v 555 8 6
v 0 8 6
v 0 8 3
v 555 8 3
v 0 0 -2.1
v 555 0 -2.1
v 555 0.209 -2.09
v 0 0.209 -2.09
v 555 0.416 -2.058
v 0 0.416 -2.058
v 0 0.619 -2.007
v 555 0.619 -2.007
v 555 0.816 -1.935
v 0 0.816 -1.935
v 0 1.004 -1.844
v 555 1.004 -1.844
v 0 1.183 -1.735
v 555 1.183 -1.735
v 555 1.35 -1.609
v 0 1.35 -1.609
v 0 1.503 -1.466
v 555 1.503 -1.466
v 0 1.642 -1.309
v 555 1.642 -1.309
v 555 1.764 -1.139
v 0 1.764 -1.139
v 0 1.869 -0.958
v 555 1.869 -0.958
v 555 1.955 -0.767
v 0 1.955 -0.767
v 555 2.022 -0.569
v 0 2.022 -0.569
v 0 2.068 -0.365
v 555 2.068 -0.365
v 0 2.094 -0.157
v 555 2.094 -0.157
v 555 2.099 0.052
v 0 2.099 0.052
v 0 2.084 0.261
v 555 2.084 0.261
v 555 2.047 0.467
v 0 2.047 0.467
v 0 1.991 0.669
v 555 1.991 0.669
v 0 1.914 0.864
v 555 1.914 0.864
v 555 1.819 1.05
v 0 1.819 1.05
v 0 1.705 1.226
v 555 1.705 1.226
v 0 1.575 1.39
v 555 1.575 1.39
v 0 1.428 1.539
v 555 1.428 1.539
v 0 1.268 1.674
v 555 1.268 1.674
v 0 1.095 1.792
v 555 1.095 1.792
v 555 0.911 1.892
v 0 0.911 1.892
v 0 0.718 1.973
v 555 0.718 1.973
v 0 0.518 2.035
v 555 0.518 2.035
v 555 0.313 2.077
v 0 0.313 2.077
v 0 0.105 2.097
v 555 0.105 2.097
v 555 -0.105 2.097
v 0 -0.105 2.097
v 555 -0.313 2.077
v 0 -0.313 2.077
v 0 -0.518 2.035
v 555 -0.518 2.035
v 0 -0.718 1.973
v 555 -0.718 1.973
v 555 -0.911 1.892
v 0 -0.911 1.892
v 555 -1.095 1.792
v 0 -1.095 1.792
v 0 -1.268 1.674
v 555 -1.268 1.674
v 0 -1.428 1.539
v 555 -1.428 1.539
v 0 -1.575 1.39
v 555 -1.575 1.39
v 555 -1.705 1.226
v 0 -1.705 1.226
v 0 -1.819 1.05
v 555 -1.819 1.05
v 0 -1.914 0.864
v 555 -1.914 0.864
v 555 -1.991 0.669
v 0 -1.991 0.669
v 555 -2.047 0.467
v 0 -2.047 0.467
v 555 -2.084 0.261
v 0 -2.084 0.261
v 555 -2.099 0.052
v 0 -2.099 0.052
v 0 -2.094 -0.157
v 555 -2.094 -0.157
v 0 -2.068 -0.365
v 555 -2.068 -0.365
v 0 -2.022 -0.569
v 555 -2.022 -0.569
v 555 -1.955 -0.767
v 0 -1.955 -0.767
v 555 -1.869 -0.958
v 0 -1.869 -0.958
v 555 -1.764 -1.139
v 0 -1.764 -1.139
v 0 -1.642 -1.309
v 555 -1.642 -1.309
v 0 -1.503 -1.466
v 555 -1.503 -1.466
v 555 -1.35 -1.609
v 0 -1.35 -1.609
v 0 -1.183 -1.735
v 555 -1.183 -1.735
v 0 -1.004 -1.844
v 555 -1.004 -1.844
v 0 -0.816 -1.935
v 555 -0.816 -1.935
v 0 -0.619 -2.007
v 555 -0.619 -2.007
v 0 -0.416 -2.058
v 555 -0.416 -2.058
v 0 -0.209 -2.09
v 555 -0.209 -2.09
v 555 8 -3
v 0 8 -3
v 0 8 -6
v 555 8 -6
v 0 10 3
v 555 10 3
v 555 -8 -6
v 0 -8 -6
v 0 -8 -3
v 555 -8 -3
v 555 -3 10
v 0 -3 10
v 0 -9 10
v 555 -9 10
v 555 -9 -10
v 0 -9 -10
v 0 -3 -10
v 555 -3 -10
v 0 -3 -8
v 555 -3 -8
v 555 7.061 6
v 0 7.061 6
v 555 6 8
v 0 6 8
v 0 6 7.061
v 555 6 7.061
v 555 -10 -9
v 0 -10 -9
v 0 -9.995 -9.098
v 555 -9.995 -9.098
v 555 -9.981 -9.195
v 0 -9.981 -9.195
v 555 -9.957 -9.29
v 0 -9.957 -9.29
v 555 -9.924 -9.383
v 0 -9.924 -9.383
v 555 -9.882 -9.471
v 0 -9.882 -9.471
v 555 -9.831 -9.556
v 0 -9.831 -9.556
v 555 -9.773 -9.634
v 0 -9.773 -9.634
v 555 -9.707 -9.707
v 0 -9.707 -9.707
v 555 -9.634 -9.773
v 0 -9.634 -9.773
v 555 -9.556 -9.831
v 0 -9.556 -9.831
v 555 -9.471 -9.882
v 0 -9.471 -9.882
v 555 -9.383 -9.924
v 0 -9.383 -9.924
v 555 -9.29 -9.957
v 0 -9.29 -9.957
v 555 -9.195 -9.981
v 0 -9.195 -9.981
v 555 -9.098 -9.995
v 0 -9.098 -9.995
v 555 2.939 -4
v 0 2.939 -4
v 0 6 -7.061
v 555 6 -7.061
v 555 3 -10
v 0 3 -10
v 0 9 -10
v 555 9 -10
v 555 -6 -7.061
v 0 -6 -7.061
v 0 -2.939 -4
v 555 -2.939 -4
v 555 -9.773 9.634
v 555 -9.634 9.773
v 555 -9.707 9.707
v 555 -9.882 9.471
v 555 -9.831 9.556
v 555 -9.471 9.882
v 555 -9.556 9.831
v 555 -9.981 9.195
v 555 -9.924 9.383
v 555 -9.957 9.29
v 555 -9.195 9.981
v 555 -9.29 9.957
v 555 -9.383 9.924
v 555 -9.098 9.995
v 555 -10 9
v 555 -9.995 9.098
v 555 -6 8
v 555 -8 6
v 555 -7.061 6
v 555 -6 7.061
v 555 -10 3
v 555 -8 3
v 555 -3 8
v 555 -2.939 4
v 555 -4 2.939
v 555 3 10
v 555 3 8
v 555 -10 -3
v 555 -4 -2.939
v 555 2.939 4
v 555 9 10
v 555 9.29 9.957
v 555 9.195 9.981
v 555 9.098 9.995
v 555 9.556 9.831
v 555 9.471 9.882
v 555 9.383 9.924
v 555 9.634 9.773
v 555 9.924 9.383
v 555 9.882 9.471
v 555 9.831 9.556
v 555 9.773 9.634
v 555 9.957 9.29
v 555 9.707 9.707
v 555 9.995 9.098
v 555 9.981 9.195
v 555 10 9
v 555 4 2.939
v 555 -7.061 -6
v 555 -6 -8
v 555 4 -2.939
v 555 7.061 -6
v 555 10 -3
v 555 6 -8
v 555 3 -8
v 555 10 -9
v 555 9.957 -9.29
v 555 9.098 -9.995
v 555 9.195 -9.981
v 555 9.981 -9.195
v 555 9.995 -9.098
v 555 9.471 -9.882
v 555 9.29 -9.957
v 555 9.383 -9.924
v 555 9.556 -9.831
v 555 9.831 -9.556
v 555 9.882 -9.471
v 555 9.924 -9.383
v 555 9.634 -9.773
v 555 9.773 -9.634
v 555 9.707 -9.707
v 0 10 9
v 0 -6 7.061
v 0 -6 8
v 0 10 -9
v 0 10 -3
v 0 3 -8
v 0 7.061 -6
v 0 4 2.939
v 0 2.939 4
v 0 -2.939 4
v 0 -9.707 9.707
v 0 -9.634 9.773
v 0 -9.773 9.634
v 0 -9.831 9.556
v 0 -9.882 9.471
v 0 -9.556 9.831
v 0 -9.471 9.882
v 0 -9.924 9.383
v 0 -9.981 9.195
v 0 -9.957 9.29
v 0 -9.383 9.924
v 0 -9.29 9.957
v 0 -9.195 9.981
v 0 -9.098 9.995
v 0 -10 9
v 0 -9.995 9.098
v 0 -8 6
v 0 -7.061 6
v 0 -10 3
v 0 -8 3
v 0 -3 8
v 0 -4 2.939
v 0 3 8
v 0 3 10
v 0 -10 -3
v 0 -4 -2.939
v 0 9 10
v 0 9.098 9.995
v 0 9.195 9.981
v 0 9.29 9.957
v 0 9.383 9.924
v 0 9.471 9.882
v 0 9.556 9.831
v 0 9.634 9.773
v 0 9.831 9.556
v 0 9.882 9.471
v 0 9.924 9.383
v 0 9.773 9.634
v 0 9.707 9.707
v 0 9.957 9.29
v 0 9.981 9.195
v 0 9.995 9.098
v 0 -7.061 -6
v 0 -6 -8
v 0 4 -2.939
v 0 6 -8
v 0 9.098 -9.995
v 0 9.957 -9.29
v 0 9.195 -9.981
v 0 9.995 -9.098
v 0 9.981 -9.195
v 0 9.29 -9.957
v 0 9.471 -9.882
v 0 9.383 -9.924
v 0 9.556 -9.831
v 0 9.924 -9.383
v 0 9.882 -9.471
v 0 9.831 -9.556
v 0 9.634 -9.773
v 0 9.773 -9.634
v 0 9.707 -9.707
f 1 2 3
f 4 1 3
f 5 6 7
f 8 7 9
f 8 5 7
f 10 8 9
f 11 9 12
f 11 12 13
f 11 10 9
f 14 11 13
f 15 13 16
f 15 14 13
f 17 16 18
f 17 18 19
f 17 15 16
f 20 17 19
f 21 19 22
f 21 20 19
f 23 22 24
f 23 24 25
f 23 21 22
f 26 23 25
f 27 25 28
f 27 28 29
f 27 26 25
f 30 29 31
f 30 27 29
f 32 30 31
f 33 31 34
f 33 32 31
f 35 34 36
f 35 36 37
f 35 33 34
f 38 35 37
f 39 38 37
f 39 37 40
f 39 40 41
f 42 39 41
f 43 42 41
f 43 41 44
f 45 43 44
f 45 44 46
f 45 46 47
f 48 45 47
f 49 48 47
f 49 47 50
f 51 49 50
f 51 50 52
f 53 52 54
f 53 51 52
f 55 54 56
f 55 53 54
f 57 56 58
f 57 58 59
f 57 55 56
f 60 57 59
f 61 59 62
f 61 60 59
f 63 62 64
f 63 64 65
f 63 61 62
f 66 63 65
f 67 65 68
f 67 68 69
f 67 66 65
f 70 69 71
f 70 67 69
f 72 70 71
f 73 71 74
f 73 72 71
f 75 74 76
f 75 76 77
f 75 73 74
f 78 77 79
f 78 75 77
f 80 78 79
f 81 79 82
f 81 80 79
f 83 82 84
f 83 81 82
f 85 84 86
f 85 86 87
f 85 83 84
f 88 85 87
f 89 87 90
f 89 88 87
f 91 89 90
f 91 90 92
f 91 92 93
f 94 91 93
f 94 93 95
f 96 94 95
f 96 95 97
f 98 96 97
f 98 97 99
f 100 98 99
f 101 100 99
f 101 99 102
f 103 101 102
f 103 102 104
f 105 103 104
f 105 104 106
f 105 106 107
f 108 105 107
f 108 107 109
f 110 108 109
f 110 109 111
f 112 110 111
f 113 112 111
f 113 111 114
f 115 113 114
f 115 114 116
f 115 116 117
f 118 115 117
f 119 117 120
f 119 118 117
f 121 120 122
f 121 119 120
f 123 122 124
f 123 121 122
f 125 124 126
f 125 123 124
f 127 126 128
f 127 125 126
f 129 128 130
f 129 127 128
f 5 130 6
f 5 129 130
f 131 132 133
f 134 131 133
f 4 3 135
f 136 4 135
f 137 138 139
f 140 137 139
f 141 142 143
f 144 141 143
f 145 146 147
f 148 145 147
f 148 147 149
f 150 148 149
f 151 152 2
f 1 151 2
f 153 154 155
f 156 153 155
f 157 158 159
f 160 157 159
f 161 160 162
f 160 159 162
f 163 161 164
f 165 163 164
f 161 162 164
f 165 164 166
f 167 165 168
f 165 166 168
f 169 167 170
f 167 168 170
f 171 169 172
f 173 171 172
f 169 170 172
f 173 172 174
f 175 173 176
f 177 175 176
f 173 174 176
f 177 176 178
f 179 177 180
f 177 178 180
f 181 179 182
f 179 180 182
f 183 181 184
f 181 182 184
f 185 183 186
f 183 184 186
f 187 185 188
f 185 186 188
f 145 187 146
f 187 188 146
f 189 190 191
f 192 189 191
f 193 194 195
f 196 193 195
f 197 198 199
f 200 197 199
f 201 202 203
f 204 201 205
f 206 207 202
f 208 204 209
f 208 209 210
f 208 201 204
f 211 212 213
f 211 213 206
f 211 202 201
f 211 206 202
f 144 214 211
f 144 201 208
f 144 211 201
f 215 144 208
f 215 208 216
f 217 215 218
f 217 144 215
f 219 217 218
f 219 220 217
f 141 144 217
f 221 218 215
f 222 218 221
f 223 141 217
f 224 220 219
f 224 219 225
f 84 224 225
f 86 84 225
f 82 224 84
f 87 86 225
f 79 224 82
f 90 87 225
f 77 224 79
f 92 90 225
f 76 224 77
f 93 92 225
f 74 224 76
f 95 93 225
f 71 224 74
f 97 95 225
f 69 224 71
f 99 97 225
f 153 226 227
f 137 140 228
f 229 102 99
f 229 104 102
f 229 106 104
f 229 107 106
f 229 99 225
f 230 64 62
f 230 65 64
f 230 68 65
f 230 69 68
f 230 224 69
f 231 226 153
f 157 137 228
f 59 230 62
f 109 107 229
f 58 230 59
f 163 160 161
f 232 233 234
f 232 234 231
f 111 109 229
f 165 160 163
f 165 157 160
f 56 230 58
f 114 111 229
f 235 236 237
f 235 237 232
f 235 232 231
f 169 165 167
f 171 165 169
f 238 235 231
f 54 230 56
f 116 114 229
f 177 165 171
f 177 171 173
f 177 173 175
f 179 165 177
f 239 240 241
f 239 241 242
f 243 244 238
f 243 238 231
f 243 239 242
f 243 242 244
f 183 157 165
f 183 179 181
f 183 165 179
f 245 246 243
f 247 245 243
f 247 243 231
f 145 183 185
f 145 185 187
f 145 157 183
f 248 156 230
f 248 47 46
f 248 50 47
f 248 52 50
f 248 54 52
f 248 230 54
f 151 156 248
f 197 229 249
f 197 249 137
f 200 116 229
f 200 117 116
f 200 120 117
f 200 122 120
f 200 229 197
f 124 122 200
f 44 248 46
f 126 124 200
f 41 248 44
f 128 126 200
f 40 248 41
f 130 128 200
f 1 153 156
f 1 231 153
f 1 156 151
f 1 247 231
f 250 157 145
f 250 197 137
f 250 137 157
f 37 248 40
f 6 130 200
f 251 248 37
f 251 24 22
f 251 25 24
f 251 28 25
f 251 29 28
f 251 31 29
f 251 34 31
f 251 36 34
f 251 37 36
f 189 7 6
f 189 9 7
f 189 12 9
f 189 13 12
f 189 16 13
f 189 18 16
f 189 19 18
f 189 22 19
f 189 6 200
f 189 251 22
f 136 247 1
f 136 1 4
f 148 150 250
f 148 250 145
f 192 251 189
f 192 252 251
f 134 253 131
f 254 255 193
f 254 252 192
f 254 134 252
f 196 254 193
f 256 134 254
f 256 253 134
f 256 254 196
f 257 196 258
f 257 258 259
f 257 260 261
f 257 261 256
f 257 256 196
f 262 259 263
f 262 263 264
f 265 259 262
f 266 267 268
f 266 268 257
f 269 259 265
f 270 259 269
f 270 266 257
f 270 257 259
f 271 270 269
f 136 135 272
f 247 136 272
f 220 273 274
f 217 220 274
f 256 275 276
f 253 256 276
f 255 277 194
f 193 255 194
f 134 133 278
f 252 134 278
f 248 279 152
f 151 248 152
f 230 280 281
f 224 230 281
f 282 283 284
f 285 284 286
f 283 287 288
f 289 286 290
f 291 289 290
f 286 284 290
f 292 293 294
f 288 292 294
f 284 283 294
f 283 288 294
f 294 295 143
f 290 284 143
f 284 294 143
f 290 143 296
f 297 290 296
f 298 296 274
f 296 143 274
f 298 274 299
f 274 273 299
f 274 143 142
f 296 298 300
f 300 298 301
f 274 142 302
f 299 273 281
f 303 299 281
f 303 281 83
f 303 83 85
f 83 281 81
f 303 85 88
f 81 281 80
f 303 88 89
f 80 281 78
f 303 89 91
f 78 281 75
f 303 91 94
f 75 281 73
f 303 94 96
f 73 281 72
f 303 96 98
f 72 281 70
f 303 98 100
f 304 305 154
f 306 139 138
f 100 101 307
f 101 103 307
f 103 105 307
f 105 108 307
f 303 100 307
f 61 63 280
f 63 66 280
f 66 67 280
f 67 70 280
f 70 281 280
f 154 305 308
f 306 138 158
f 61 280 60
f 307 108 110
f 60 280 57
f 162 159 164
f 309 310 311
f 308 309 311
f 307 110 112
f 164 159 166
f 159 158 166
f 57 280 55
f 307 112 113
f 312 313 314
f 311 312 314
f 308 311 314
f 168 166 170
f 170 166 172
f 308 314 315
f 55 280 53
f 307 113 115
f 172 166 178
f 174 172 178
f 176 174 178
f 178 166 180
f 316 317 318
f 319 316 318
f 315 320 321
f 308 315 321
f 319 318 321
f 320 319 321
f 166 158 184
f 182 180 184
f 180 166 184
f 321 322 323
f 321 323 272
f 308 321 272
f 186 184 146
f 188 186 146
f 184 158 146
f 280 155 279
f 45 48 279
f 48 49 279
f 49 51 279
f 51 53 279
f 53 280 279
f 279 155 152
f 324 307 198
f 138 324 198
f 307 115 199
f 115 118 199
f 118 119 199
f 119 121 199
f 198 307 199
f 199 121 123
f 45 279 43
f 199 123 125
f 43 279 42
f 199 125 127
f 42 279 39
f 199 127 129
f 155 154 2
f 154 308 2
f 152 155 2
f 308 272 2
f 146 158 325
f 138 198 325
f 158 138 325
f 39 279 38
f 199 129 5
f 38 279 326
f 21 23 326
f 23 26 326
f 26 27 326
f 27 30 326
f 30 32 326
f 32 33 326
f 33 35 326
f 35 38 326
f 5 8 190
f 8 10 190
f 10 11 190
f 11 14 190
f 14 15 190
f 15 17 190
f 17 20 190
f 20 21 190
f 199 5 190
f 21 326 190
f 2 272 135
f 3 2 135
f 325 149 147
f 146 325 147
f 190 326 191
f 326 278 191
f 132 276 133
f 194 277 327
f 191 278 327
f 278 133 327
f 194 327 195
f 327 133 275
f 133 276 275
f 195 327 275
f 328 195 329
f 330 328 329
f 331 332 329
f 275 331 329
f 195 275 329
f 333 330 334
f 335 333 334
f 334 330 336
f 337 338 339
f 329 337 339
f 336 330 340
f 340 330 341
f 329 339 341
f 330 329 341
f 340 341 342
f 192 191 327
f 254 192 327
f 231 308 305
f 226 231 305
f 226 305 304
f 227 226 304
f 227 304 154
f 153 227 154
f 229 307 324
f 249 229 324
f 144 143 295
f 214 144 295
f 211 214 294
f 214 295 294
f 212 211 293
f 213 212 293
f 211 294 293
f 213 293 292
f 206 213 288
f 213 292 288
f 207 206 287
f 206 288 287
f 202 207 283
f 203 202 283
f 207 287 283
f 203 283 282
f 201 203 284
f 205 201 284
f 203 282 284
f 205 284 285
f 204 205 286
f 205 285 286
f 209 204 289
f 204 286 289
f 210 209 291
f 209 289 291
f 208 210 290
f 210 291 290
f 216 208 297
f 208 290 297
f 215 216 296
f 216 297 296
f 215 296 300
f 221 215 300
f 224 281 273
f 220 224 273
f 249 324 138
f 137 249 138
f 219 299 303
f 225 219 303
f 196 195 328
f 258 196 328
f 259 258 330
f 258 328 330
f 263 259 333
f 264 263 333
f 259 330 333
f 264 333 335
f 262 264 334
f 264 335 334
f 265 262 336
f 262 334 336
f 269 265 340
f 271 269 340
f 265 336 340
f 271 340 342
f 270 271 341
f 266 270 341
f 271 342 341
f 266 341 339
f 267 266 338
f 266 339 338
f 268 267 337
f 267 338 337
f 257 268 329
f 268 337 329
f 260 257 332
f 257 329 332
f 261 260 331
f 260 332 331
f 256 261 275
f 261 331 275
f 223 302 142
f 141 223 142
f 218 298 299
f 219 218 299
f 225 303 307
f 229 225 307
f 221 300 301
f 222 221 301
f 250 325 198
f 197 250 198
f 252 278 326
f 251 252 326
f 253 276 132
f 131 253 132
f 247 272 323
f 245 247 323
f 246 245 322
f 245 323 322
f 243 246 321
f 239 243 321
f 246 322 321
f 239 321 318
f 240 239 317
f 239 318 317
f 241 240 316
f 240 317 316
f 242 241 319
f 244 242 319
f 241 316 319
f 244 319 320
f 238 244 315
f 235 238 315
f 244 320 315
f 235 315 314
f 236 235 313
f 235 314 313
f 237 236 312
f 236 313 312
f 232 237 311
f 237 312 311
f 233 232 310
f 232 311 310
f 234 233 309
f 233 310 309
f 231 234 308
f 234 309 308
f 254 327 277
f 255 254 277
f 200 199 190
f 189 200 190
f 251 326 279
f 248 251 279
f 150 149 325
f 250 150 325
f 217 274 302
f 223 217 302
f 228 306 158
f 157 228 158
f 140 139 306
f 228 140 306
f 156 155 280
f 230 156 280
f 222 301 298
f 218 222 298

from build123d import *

# Parameters (mm, degrees)
SKETCH1_R           = 2.1
BOSS_EXTRUDE1_DEPTH = 555


with BuildPart() as part:
    # Sketch1 → Boss-Extrude1 (new body)
    with BuildSketch(Plane(origin=(0, 0, 0), x_dir=(0, 0, -1), z_dir=(1, 0, 0))):
        with BuildLine():
            Line((-10, 9), (-10, 3))
            Line((-10, 3), (-8, 3))
            Line((-8, 3), (-8, 6))
            Line((-8, 6), (-7.060660172, 6))
            Line((-7.060660172, 6), (-4, 2.939339828))
            Line((-4, 2.939339828), (-4, -2.939339828))
            Line((-4, -2.939339828), (-7.060660172, -6))
            Line((-7.060660172, -6), (-8, -6))
            Line((-8, -6), (-8, -3))
            Line((-8, -3), (-10, -3))
            Line((-10, -3), (-10, -9))
            ThreePointArc((-10, -9), (-9.707106781, -9.707106781), (-9, -10))
            Line((-9, -10), (-3, -10))
            Line((-3, -10), (-3, -8))
            Line((-3, -8), (-6, -8))
            Line((-6, -8), (-6, -7.060660172))
            Line((-6, -7.060660172), (-2.939339828, -4))
            Line((-2.939339828, -4), (2.939339828, -4))
            Line((2.939339828, -4), (6, -7.060660172))
            Line((6, -7.060660172), (6, -8))
            Line((6, -8), (3, -8))
            Line((3, -8), (3, -10))
            Line((3, -10), (9, -10))
            ThreePointArc((9, -10), (9.707106781, -9.707106781), (10, -9))
            Line((10, -9), (10, -3))
            Line((10, -3), (8, -3))
            Line((8, -3), (8, -6))
            Line((8, -6), (7.060660172, -6))
            Line((7.060660172, -6), (4, -2.939339828))
            Line((4, -2.939339828), (4, 2.939339828))
            Line((4, 2.939339828), (7.060660172, 6))
            Line((7.060660172, 6), (8, 6))
            Line((8, 6), (8, 3))
            Line((8, 3), (10, 3))
            Line((10, 3), (10, 9))
            ThreePointArc((10, 9), (9.707106781, 9.707106781), (9, 10))
            Line((9, 10), (3, 10))
            Line((3, 10), (3, 8))
            Line((3, 8), (6, 8))
            Line((6, 8), (6, 7.060660172))
            Line((6, 7.060660172), (2.939339828, 4))
            Line((2.939339828, 4), (-2.939339828, 4))
            Line((-2.939339828, 4), (-6, 7.060660172))
            Line((-6, 7.060660172), (-6, 8))
            Line((-6, 8), (-3, 8))
            Line((-3, 8), (-3, 10))
            Line((-3, 10), (-9, 10))
            ThreePointArc((-9, 10), (-9.707106781, 9.707106781), (-10, 9))
        make_face()
        Circle(SKETCH1_R, mode=Mode.SUBTRACT)
    extrude(amount=BOSS_EXTRUDE1_DEPTH)


solid = part.part
